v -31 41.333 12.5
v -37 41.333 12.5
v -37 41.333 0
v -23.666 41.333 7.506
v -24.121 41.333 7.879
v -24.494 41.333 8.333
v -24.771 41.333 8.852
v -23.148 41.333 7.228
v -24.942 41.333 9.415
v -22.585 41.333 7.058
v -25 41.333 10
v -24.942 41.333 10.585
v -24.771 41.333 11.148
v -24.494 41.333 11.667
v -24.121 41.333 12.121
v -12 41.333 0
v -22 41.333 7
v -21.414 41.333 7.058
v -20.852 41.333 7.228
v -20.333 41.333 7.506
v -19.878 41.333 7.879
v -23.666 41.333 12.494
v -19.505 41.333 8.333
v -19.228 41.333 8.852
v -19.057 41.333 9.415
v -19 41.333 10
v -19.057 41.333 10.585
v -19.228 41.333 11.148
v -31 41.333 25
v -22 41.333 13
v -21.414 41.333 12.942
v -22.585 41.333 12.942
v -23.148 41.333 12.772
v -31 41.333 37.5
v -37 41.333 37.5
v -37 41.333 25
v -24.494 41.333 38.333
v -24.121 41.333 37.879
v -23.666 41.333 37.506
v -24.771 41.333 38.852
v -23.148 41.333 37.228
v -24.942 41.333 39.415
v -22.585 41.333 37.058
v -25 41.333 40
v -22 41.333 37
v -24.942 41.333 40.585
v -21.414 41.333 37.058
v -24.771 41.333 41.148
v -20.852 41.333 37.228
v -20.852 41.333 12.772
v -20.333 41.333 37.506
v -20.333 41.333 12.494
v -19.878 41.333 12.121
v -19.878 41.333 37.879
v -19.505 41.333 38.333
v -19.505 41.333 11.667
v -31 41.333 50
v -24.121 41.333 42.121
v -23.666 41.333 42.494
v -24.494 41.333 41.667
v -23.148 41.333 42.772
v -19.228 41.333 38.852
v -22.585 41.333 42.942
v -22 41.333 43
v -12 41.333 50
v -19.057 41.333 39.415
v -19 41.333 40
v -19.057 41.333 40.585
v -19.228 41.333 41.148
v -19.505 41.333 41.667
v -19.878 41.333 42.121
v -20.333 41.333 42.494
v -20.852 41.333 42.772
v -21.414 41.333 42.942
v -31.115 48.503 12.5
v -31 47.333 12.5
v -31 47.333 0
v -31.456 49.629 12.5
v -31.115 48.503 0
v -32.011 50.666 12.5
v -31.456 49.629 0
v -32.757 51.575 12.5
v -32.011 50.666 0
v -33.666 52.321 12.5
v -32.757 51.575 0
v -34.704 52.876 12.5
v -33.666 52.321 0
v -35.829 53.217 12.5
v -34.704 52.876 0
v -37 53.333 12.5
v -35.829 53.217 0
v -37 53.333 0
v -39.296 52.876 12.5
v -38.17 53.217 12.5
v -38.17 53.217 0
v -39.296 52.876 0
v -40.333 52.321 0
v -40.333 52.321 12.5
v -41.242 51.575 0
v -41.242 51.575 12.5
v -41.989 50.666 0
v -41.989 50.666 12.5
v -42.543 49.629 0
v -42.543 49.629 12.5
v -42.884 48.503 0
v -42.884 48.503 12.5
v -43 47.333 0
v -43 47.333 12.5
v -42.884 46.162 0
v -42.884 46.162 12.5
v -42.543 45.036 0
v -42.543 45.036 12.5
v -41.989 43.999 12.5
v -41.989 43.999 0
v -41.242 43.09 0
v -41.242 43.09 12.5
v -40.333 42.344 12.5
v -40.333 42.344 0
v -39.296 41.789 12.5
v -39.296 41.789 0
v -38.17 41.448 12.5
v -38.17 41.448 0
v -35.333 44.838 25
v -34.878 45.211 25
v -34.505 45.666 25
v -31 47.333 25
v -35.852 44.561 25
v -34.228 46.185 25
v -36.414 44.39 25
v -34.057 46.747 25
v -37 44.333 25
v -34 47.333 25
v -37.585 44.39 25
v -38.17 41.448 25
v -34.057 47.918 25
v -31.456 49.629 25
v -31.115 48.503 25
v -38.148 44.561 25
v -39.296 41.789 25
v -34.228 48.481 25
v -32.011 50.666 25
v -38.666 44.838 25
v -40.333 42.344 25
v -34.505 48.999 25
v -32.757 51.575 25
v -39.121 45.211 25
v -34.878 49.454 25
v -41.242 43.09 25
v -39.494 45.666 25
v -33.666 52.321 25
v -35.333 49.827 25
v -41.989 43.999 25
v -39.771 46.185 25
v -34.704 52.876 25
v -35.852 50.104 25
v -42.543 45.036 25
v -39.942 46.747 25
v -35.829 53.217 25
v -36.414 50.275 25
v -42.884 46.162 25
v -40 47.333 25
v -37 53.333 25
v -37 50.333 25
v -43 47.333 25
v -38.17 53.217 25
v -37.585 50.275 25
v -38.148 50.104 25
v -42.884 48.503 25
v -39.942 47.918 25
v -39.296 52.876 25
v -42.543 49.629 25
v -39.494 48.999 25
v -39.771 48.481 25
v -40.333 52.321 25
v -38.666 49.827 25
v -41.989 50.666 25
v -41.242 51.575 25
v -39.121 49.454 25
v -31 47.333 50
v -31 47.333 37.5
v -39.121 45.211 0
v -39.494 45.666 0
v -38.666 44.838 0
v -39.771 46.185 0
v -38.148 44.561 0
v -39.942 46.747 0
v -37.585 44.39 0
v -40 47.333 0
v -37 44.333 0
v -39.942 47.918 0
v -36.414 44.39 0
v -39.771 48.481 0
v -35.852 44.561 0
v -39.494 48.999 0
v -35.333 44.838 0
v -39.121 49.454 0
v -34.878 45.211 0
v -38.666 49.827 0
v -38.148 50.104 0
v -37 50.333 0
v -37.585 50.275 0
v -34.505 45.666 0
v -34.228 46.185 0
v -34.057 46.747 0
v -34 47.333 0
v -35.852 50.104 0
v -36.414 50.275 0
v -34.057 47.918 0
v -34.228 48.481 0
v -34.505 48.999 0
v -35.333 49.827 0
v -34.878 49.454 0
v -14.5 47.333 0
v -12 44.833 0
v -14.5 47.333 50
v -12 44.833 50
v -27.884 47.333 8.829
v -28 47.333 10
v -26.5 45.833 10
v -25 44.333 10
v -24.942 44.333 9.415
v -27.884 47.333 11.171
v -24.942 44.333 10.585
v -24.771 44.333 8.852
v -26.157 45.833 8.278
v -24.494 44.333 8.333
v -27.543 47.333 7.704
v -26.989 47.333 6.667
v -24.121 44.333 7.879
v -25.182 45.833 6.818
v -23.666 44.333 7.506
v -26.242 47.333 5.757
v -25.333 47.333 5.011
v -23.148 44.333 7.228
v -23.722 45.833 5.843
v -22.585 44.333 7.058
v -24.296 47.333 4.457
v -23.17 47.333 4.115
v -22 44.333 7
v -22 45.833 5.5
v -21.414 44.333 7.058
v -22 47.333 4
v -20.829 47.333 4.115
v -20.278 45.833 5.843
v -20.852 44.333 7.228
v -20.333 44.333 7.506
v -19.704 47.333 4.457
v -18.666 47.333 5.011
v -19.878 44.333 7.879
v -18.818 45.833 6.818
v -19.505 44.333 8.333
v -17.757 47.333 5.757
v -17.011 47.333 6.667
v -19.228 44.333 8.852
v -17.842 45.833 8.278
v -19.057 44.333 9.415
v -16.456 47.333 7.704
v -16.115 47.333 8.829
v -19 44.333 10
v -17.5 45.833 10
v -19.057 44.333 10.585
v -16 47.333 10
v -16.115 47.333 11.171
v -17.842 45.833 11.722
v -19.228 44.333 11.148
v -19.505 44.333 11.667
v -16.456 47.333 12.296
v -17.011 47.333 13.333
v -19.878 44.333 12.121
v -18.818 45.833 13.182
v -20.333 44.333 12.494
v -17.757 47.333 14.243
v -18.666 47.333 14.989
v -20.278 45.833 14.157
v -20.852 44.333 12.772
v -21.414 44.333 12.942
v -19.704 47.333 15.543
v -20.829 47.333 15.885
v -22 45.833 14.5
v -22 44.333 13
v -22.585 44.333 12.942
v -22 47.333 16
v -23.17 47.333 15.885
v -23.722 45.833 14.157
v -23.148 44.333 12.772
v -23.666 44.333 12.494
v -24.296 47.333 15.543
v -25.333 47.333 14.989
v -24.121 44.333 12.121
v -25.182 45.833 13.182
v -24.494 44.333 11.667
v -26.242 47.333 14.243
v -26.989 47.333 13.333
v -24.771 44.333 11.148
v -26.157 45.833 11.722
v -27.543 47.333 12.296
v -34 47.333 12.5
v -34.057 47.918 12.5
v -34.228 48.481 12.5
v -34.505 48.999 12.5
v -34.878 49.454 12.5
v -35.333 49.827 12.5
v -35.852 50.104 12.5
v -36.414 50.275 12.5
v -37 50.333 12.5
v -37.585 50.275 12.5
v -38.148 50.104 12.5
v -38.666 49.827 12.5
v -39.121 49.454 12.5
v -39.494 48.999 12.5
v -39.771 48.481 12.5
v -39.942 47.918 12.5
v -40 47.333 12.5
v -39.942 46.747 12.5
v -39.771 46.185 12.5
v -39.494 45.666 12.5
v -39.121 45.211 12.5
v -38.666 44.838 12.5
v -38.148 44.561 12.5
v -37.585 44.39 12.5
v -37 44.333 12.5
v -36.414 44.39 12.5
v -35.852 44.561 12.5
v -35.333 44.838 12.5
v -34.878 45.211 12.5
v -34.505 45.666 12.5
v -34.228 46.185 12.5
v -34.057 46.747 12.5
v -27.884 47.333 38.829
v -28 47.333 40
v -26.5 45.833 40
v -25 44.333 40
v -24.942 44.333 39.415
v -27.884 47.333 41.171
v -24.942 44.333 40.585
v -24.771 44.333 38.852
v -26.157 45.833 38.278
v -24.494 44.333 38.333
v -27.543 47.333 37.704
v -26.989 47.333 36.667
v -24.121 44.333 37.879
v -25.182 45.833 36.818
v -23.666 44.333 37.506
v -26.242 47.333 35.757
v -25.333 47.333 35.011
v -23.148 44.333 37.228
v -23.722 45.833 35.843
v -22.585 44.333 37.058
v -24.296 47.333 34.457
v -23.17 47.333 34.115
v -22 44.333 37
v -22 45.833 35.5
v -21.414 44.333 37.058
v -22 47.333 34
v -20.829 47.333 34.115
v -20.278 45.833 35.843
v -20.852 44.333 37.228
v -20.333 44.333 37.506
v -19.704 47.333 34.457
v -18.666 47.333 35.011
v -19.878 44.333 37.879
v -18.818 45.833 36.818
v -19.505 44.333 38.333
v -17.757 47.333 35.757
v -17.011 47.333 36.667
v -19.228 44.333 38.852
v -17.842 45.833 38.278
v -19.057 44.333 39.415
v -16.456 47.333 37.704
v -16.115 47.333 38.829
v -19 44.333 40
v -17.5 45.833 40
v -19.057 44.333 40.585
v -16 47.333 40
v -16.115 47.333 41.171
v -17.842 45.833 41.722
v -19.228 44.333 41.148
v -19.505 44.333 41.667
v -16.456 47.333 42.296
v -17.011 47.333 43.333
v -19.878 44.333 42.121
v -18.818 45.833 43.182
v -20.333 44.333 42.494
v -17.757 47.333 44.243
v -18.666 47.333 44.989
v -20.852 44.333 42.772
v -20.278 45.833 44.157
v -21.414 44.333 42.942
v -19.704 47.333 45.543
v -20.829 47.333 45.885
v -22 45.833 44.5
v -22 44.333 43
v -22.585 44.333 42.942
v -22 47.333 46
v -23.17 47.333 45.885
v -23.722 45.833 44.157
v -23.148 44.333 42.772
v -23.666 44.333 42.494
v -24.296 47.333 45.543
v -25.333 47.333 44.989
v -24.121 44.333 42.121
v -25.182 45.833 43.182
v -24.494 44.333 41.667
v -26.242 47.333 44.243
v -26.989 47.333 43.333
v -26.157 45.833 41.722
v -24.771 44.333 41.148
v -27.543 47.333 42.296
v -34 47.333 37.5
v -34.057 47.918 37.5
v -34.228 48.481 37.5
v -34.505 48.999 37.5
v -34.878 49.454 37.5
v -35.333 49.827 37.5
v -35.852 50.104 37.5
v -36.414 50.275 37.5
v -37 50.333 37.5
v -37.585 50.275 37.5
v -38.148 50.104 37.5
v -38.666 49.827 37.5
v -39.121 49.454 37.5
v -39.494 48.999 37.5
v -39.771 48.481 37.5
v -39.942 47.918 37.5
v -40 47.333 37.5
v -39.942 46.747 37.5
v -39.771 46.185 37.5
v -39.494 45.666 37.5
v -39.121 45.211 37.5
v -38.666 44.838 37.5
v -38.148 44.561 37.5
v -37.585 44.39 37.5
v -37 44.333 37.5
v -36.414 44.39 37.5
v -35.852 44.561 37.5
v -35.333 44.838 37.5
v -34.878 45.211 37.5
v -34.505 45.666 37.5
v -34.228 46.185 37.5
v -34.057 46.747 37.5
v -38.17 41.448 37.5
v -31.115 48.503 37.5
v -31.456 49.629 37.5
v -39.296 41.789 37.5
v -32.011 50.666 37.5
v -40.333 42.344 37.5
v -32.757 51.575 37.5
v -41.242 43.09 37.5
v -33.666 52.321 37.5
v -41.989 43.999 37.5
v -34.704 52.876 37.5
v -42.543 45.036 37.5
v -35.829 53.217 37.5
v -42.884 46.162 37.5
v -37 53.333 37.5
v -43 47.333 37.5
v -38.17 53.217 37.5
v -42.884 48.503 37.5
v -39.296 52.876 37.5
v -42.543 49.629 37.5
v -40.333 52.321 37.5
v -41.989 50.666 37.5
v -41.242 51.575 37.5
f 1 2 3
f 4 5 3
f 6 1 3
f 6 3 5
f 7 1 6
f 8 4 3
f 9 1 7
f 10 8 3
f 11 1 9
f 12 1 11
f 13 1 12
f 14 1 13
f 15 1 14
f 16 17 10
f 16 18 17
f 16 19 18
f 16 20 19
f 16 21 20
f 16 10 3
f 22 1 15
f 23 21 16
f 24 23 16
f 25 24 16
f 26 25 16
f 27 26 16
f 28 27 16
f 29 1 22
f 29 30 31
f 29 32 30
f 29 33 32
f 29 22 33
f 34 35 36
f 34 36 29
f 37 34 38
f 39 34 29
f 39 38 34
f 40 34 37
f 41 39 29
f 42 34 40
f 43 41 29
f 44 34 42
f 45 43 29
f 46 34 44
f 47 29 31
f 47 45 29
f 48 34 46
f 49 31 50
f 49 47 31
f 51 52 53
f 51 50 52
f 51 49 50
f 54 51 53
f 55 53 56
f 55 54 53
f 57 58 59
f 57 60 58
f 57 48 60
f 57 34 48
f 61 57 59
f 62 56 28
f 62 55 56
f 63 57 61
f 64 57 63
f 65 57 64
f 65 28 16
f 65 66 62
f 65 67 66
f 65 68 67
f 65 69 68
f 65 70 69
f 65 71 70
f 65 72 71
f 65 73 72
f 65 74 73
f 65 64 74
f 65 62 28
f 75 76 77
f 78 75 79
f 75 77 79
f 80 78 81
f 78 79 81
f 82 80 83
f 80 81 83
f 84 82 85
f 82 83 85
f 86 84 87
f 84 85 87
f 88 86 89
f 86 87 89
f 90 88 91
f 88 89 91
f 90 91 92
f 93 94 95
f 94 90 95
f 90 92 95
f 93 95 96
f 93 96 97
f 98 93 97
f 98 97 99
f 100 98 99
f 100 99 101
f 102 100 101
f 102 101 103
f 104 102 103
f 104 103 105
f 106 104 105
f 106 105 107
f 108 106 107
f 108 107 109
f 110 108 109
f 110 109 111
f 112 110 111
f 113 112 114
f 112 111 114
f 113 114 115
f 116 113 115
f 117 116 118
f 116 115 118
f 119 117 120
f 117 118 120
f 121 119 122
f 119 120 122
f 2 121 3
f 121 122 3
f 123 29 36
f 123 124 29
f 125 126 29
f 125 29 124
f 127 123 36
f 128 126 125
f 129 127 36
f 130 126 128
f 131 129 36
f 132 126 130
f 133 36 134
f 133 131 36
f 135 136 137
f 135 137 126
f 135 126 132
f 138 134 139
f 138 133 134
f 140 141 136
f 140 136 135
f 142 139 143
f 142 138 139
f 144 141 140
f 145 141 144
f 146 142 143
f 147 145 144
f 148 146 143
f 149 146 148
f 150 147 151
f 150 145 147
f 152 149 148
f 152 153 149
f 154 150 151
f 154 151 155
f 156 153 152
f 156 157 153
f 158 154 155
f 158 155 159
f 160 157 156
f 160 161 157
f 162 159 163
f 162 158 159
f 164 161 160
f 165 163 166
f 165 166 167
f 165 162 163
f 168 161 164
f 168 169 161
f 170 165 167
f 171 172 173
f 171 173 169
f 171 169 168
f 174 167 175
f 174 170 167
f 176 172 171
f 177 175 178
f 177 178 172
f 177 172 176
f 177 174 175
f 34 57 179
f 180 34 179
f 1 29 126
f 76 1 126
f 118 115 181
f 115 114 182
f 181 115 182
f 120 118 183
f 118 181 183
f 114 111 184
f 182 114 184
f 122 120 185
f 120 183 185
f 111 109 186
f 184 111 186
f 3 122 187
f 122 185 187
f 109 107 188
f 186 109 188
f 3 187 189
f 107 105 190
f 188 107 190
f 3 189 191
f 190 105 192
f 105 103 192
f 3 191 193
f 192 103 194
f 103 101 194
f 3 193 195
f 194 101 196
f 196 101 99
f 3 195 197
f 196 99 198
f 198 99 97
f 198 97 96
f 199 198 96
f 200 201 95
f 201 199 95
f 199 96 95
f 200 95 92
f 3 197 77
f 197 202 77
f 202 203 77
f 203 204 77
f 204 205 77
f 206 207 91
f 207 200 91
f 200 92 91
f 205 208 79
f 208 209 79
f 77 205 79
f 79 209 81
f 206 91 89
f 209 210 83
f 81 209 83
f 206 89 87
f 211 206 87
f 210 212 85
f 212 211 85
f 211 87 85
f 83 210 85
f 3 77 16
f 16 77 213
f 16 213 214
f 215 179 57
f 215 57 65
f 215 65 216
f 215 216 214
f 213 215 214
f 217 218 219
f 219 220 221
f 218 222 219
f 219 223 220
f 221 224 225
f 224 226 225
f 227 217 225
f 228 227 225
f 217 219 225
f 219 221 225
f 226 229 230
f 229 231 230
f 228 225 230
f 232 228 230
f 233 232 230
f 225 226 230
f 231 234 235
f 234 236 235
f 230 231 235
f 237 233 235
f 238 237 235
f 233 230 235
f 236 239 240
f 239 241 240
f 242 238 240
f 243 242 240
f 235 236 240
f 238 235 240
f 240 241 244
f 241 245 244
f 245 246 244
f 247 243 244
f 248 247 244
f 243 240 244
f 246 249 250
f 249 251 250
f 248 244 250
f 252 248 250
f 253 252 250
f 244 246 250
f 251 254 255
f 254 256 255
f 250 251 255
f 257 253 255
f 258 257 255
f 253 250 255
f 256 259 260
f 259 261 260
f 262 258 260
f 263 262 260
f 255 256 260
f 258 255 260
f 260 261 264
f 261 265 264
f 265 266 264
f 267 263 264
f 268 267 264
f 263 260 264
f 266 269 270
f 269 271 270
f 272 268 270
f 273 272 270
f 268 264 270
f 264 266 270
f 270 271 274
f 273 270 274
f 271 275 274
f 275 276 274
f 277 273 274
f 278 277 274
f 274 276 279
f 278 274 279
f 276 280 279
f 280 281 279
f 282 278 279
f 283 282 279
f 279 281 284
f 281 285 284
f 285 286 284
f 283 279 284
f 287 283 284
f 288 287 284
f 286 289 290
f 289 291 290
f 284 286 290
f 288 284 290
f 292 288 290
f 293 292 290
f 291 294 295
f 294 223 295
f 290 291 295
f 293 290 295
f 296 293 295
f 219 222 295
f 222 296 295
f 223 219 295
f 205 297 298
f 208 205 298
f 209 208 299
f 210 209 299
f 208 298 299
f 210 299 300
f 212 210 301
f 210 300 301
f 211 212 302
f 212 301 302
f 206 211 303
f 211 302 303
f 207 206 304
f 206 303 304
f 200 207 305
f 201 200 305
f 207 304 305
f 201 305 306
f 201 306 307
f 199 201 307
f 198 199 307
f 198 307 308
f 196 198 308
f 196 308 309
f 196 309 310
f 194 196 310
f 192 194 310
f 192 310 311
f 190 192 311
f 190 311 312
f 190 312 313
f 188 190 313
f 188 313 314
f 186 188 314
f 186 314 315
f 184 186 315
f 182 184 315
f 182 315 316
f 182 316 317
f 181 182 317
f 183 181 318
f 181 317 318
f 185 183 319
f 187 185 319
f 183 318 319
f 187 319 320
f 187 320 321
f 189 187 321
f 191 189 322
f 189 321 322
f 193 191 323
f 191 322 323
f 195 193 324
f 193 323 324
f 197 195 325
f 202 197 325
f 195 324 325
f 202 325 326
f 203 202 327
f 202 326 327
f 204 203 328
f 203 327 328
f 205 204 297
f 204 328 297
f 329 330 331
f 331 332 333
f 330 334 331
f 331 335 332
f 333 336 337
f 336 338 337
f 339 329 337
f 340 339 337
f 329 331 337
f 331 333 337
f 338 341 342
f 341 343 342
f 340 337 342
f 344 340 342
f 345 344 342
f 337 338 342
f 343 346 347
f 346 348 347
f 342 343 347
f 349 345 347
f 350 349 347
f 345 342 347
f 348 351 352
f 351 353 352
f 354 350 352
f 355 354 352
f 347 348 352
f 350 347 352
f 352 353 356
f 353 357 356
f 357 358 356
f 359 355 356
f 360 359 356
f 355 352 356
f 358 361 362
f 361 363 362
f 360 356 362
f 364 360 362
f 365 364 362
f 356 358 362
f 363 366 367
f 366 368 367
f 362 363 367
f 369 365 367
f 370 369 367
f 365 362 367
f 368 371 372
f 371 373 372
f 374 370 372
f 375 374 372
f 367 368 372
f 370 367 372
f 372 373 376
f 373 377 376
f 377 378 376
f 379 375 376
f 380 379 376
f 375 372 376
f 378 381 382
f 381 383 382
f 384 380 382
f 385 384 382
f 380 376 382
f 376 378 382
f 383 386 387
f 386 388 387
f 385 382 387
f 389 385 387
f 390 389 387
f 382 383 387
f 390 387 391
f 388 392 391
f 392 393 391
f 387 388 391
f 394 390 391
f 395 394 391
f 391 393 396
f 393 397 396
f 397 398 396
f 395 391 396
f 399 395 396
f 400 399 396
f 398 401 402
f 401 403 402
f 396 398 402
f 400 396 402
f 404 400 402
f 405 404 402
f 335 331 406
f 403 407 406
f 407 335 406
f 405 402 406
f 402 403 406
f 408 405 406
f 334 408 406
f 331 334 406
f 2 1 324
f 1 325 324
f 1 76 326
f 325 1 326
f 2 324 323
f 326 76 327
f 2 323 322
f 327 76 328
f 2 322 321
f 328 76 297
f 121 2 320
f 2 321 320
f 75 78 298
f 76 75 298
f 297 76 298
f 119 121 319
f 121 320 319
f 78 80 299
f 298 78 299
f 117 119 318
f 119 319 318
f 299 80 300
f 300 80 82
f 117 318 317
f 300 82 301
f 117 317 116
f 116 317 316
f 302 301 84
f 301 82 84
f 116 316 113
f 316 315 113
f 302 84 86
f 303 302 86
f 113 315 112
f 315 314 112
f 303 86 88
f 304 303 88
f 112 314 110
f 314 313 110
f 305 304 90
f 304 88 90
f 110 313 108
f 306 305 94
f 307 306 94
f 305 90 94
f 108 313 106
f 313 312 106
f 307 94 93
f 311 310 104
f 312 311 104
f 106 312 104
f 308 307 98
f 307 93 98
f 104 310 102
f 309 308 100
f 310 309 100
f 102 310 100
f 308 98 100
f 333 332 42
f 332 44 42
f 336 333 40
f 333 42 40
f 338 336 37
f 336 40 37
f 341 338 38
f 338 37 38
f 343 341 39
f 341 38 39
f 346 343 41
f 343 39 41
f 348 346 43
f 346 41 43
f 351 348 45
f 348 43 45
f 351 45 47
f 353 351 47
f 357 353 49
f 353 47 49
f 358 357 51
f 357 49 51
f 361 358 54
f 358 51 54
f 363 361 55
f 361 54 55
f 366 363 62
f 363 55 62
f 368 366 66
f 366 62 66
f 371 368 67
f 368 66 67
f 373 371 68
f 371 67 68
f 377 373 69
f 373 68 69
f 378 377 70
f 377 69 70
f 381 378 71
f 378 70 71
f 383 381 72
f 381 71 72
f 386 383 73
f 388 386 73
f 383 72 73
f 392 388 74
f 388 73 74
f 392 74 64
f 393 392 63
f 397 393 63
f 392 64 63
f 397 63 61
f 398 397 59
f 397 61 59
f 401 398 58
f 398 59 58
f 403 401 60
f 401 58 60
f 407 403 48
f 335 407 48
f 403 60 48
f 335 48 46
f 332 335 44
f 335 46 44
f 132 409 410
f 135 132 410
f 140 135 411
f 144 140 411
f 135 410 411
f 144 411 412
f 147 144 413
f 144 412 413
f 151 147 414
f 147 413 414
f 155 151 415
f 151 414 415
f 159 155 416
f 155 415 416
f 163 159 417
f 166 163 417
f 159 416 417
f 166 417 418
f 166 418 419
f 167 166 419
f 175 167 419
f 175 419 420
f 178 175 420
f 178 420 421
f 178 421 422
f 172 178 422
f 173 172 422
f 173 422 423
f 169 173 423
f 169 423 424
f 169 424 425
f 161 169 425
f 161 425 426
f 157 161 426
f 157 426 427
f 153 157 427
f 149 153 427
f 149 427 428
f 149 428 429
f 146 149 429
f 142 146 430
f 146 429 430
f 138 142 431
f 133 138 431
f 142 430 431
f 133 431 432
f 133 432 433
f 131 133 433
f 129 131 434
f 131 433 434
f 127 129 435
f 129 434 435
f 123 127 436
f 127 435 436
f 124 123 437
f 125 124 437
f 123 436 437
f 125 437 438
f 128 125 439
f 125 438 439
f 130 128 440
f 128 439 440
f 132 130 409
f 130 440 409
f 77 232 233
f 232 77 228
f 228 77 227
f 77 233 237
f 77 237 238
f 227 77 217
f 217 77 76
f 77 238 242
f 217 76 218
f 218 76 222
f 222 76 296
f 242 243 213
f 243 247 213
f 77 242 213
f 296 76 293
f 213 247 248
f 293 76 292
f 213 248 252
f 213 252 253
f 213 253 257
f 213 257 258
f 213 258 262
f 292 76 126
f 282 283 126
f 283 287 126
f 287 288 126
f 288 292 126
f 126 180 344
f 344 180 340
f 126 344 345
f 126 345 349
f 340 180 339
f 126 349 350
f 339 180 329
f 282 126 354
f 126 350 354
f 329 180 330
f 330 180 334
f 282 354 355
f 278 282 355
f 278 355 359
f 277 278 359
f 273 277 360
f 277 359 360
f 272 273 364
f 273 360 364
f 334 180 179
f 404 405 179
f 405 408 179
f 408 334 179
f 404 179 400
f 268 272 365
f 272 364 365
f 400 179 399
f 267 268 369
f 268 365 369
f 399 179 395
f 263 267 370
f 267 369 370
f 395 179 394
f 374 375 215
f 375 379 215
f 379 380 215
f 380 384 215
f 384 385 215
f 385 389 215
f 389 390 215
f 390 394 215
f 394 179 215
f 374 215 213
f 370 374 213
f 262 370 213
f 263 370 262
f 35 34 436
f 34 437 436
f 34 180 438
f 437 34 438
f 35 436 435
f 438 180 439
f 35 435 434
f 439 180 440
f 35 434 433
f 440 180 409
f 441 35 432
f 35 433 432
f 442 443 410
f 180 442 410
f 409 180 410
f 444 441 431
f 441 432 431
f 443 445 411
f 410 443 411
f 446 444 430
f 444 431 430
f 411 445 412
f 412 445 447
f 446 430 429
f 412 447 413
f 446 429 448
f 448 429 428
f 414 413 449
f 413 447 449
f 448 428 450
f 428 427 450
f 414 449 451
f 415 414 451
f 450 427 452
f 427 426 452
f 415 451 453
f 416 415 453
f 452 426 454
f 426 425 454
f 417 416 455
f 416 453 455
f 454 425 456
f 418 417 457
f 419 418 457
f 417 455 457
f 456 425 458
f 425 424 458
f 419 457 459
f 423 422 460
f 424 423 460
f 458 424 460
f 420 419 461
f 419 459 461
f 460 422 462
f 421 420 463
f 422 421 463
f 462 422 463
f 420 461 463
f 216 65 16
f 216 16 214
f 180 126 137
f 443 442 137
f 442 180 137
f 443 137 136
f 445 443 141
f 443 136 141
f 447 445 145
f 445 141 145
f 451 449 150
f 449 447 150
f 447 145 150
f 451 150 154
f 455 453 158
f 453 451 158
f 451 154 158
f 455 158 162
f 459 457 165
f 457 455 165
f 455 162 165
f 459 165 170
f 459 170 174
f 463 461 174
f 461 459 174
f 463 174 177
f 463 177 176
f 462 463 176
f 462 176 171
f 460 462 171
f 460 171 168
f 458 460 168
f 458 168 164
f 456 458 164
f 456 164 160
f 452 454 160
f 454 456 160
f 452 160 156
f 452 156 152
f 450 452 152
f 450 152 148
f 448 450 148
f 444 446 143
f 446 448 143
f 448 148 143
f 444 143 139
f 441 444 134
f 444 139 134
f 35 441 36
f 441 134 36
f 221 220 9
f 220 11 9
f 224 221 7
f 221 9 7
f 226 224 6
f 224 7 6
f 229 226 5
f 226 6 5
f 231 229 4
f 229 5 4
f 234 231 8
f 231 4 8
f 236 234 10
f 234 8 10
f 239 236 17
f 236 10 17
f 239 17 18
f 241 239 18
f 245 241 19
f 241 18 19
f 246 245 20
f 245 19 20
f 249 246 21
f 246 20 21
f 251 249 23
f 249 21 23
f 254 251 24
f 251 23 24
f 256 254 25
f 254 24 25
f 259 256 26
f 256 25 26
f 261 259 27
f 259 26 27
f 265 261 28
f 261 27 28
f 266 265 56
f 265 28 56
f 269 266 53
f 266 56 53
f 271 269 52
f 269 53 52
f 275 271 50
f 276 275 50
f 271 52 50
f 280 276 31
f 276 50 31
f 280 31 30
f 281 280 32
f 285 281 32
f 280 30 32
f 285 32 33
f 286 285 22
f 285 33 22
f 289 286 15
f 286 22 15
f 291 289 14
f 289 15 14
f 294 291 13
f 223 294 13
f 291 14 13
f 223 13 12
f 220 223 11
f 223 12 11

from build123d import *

# Parameters (mm, degrees)
SKETCH_1_R                = 6
EXTRUDE_1_DEPTH           = 50
SKETCH_2_W                = 25
SKETCH_2_H                = 6
EXTRUDE_2_DEPTH           = 50
SKETCH_5_R                = 3
CUT_EXTRUDE_1_DEPTH       = 50
HOLE_WIZARD_1_D           = 6
HOLE_WIZARD_1_CSINK_D     = 12
HOLE_WIZARD_1_CSINK_ANGLE = 90
CUT_EXTRUDE_2_DEPTH       = 12.5
PATTERN_LINEAR_2_COUNT    = 2
PATTERN_LINEAR_2_PITCH    = 25
CHAMFER_1_SIZE            = 2.5


with BuildPart() as part:
    # 草图1 → 凸台-拉伸1 (new body)
    with BuildSketch(Plane.XY):
        with Locations((-36.999696345, 47.332553752)):
            Circle(SKETCH_1_R)
    extrude(amount=EXTRUDE_1_DEPTH)

    # 草图2 → 凸台-拉伸2 (add)
    with BuildSketch(Plane.XY.offset(50)):
        with Locations((-24.499696345, 44.332553752)):
            Rectangle(SKETCH_2_W, SKETCH_2_H)
    extrude(amount=-EXTRUDE_2_DEPTH)

    # 草图5 → 切除-拉伸1 (cut)
    with BuildSketch(Plane.XY.offset(50)):
        with Locations((-36.999696345, 47.332553752)):
            Circle(SKETCH_5_R)
    extrude(amount=-CUT_EXTRUDE_1_DEPTH, mode=Mode.SUBTRACT)

    # 打孔尺寸(%根据)内六角花形半沉头螺钉的类型1 (through all)
    with Locations(Plane(origin=(0, 47.332553752, 0), x_dir=(1, 0, 0), z_dir=(0, 1, 0))):
        with Locations((-21.999696345, -40), (-21.999696345, -10)):
            CounterSinkHole(HOLE_WIZARD_1_D / 2, HOLE_WIZARD_1_CSINK_D / 2, counter_sink_angle=HOLE_WIZARD_1_CSINK_ANGLE)

    # 草图9 → 切除-拉伸2 (cut)
    with BuildSketch(Plane.XY.offset(50)):
        Polygon((-30.999696345, 47.332553752), (-30.999696345, 35.818106439), (-46.000108994, 35.818106439), (-46.000108994, 53.909109131), (-30.999696345, 53.909109131), align=None)
    cut_extrude_2 = extrude(amount=-CUT_EXTRUDE_2_DEPTH, mode=Mode.SUBTRACT)

    # 阵列(线性)2: 切除-拉伸2 ×2
    with Locations(*[(0, 0, -i * PATTERN_LINEAR_2_PITCH) for i in range(1, PATTERN_LINEAR_2_COUNT)]):
        add(cut_extrude_2, mode=Mode.SUBTRACT)

    # 倒角1
    chamfer_1_edges = [part.edges().sort_by_distance(p)[0] for p in [
        (-11.999696345, 47.332553752, 25),
    ]]
    chamfer(chamfer_1_edges, length=CHAMFER_1_SIZE)


solid = part.part
